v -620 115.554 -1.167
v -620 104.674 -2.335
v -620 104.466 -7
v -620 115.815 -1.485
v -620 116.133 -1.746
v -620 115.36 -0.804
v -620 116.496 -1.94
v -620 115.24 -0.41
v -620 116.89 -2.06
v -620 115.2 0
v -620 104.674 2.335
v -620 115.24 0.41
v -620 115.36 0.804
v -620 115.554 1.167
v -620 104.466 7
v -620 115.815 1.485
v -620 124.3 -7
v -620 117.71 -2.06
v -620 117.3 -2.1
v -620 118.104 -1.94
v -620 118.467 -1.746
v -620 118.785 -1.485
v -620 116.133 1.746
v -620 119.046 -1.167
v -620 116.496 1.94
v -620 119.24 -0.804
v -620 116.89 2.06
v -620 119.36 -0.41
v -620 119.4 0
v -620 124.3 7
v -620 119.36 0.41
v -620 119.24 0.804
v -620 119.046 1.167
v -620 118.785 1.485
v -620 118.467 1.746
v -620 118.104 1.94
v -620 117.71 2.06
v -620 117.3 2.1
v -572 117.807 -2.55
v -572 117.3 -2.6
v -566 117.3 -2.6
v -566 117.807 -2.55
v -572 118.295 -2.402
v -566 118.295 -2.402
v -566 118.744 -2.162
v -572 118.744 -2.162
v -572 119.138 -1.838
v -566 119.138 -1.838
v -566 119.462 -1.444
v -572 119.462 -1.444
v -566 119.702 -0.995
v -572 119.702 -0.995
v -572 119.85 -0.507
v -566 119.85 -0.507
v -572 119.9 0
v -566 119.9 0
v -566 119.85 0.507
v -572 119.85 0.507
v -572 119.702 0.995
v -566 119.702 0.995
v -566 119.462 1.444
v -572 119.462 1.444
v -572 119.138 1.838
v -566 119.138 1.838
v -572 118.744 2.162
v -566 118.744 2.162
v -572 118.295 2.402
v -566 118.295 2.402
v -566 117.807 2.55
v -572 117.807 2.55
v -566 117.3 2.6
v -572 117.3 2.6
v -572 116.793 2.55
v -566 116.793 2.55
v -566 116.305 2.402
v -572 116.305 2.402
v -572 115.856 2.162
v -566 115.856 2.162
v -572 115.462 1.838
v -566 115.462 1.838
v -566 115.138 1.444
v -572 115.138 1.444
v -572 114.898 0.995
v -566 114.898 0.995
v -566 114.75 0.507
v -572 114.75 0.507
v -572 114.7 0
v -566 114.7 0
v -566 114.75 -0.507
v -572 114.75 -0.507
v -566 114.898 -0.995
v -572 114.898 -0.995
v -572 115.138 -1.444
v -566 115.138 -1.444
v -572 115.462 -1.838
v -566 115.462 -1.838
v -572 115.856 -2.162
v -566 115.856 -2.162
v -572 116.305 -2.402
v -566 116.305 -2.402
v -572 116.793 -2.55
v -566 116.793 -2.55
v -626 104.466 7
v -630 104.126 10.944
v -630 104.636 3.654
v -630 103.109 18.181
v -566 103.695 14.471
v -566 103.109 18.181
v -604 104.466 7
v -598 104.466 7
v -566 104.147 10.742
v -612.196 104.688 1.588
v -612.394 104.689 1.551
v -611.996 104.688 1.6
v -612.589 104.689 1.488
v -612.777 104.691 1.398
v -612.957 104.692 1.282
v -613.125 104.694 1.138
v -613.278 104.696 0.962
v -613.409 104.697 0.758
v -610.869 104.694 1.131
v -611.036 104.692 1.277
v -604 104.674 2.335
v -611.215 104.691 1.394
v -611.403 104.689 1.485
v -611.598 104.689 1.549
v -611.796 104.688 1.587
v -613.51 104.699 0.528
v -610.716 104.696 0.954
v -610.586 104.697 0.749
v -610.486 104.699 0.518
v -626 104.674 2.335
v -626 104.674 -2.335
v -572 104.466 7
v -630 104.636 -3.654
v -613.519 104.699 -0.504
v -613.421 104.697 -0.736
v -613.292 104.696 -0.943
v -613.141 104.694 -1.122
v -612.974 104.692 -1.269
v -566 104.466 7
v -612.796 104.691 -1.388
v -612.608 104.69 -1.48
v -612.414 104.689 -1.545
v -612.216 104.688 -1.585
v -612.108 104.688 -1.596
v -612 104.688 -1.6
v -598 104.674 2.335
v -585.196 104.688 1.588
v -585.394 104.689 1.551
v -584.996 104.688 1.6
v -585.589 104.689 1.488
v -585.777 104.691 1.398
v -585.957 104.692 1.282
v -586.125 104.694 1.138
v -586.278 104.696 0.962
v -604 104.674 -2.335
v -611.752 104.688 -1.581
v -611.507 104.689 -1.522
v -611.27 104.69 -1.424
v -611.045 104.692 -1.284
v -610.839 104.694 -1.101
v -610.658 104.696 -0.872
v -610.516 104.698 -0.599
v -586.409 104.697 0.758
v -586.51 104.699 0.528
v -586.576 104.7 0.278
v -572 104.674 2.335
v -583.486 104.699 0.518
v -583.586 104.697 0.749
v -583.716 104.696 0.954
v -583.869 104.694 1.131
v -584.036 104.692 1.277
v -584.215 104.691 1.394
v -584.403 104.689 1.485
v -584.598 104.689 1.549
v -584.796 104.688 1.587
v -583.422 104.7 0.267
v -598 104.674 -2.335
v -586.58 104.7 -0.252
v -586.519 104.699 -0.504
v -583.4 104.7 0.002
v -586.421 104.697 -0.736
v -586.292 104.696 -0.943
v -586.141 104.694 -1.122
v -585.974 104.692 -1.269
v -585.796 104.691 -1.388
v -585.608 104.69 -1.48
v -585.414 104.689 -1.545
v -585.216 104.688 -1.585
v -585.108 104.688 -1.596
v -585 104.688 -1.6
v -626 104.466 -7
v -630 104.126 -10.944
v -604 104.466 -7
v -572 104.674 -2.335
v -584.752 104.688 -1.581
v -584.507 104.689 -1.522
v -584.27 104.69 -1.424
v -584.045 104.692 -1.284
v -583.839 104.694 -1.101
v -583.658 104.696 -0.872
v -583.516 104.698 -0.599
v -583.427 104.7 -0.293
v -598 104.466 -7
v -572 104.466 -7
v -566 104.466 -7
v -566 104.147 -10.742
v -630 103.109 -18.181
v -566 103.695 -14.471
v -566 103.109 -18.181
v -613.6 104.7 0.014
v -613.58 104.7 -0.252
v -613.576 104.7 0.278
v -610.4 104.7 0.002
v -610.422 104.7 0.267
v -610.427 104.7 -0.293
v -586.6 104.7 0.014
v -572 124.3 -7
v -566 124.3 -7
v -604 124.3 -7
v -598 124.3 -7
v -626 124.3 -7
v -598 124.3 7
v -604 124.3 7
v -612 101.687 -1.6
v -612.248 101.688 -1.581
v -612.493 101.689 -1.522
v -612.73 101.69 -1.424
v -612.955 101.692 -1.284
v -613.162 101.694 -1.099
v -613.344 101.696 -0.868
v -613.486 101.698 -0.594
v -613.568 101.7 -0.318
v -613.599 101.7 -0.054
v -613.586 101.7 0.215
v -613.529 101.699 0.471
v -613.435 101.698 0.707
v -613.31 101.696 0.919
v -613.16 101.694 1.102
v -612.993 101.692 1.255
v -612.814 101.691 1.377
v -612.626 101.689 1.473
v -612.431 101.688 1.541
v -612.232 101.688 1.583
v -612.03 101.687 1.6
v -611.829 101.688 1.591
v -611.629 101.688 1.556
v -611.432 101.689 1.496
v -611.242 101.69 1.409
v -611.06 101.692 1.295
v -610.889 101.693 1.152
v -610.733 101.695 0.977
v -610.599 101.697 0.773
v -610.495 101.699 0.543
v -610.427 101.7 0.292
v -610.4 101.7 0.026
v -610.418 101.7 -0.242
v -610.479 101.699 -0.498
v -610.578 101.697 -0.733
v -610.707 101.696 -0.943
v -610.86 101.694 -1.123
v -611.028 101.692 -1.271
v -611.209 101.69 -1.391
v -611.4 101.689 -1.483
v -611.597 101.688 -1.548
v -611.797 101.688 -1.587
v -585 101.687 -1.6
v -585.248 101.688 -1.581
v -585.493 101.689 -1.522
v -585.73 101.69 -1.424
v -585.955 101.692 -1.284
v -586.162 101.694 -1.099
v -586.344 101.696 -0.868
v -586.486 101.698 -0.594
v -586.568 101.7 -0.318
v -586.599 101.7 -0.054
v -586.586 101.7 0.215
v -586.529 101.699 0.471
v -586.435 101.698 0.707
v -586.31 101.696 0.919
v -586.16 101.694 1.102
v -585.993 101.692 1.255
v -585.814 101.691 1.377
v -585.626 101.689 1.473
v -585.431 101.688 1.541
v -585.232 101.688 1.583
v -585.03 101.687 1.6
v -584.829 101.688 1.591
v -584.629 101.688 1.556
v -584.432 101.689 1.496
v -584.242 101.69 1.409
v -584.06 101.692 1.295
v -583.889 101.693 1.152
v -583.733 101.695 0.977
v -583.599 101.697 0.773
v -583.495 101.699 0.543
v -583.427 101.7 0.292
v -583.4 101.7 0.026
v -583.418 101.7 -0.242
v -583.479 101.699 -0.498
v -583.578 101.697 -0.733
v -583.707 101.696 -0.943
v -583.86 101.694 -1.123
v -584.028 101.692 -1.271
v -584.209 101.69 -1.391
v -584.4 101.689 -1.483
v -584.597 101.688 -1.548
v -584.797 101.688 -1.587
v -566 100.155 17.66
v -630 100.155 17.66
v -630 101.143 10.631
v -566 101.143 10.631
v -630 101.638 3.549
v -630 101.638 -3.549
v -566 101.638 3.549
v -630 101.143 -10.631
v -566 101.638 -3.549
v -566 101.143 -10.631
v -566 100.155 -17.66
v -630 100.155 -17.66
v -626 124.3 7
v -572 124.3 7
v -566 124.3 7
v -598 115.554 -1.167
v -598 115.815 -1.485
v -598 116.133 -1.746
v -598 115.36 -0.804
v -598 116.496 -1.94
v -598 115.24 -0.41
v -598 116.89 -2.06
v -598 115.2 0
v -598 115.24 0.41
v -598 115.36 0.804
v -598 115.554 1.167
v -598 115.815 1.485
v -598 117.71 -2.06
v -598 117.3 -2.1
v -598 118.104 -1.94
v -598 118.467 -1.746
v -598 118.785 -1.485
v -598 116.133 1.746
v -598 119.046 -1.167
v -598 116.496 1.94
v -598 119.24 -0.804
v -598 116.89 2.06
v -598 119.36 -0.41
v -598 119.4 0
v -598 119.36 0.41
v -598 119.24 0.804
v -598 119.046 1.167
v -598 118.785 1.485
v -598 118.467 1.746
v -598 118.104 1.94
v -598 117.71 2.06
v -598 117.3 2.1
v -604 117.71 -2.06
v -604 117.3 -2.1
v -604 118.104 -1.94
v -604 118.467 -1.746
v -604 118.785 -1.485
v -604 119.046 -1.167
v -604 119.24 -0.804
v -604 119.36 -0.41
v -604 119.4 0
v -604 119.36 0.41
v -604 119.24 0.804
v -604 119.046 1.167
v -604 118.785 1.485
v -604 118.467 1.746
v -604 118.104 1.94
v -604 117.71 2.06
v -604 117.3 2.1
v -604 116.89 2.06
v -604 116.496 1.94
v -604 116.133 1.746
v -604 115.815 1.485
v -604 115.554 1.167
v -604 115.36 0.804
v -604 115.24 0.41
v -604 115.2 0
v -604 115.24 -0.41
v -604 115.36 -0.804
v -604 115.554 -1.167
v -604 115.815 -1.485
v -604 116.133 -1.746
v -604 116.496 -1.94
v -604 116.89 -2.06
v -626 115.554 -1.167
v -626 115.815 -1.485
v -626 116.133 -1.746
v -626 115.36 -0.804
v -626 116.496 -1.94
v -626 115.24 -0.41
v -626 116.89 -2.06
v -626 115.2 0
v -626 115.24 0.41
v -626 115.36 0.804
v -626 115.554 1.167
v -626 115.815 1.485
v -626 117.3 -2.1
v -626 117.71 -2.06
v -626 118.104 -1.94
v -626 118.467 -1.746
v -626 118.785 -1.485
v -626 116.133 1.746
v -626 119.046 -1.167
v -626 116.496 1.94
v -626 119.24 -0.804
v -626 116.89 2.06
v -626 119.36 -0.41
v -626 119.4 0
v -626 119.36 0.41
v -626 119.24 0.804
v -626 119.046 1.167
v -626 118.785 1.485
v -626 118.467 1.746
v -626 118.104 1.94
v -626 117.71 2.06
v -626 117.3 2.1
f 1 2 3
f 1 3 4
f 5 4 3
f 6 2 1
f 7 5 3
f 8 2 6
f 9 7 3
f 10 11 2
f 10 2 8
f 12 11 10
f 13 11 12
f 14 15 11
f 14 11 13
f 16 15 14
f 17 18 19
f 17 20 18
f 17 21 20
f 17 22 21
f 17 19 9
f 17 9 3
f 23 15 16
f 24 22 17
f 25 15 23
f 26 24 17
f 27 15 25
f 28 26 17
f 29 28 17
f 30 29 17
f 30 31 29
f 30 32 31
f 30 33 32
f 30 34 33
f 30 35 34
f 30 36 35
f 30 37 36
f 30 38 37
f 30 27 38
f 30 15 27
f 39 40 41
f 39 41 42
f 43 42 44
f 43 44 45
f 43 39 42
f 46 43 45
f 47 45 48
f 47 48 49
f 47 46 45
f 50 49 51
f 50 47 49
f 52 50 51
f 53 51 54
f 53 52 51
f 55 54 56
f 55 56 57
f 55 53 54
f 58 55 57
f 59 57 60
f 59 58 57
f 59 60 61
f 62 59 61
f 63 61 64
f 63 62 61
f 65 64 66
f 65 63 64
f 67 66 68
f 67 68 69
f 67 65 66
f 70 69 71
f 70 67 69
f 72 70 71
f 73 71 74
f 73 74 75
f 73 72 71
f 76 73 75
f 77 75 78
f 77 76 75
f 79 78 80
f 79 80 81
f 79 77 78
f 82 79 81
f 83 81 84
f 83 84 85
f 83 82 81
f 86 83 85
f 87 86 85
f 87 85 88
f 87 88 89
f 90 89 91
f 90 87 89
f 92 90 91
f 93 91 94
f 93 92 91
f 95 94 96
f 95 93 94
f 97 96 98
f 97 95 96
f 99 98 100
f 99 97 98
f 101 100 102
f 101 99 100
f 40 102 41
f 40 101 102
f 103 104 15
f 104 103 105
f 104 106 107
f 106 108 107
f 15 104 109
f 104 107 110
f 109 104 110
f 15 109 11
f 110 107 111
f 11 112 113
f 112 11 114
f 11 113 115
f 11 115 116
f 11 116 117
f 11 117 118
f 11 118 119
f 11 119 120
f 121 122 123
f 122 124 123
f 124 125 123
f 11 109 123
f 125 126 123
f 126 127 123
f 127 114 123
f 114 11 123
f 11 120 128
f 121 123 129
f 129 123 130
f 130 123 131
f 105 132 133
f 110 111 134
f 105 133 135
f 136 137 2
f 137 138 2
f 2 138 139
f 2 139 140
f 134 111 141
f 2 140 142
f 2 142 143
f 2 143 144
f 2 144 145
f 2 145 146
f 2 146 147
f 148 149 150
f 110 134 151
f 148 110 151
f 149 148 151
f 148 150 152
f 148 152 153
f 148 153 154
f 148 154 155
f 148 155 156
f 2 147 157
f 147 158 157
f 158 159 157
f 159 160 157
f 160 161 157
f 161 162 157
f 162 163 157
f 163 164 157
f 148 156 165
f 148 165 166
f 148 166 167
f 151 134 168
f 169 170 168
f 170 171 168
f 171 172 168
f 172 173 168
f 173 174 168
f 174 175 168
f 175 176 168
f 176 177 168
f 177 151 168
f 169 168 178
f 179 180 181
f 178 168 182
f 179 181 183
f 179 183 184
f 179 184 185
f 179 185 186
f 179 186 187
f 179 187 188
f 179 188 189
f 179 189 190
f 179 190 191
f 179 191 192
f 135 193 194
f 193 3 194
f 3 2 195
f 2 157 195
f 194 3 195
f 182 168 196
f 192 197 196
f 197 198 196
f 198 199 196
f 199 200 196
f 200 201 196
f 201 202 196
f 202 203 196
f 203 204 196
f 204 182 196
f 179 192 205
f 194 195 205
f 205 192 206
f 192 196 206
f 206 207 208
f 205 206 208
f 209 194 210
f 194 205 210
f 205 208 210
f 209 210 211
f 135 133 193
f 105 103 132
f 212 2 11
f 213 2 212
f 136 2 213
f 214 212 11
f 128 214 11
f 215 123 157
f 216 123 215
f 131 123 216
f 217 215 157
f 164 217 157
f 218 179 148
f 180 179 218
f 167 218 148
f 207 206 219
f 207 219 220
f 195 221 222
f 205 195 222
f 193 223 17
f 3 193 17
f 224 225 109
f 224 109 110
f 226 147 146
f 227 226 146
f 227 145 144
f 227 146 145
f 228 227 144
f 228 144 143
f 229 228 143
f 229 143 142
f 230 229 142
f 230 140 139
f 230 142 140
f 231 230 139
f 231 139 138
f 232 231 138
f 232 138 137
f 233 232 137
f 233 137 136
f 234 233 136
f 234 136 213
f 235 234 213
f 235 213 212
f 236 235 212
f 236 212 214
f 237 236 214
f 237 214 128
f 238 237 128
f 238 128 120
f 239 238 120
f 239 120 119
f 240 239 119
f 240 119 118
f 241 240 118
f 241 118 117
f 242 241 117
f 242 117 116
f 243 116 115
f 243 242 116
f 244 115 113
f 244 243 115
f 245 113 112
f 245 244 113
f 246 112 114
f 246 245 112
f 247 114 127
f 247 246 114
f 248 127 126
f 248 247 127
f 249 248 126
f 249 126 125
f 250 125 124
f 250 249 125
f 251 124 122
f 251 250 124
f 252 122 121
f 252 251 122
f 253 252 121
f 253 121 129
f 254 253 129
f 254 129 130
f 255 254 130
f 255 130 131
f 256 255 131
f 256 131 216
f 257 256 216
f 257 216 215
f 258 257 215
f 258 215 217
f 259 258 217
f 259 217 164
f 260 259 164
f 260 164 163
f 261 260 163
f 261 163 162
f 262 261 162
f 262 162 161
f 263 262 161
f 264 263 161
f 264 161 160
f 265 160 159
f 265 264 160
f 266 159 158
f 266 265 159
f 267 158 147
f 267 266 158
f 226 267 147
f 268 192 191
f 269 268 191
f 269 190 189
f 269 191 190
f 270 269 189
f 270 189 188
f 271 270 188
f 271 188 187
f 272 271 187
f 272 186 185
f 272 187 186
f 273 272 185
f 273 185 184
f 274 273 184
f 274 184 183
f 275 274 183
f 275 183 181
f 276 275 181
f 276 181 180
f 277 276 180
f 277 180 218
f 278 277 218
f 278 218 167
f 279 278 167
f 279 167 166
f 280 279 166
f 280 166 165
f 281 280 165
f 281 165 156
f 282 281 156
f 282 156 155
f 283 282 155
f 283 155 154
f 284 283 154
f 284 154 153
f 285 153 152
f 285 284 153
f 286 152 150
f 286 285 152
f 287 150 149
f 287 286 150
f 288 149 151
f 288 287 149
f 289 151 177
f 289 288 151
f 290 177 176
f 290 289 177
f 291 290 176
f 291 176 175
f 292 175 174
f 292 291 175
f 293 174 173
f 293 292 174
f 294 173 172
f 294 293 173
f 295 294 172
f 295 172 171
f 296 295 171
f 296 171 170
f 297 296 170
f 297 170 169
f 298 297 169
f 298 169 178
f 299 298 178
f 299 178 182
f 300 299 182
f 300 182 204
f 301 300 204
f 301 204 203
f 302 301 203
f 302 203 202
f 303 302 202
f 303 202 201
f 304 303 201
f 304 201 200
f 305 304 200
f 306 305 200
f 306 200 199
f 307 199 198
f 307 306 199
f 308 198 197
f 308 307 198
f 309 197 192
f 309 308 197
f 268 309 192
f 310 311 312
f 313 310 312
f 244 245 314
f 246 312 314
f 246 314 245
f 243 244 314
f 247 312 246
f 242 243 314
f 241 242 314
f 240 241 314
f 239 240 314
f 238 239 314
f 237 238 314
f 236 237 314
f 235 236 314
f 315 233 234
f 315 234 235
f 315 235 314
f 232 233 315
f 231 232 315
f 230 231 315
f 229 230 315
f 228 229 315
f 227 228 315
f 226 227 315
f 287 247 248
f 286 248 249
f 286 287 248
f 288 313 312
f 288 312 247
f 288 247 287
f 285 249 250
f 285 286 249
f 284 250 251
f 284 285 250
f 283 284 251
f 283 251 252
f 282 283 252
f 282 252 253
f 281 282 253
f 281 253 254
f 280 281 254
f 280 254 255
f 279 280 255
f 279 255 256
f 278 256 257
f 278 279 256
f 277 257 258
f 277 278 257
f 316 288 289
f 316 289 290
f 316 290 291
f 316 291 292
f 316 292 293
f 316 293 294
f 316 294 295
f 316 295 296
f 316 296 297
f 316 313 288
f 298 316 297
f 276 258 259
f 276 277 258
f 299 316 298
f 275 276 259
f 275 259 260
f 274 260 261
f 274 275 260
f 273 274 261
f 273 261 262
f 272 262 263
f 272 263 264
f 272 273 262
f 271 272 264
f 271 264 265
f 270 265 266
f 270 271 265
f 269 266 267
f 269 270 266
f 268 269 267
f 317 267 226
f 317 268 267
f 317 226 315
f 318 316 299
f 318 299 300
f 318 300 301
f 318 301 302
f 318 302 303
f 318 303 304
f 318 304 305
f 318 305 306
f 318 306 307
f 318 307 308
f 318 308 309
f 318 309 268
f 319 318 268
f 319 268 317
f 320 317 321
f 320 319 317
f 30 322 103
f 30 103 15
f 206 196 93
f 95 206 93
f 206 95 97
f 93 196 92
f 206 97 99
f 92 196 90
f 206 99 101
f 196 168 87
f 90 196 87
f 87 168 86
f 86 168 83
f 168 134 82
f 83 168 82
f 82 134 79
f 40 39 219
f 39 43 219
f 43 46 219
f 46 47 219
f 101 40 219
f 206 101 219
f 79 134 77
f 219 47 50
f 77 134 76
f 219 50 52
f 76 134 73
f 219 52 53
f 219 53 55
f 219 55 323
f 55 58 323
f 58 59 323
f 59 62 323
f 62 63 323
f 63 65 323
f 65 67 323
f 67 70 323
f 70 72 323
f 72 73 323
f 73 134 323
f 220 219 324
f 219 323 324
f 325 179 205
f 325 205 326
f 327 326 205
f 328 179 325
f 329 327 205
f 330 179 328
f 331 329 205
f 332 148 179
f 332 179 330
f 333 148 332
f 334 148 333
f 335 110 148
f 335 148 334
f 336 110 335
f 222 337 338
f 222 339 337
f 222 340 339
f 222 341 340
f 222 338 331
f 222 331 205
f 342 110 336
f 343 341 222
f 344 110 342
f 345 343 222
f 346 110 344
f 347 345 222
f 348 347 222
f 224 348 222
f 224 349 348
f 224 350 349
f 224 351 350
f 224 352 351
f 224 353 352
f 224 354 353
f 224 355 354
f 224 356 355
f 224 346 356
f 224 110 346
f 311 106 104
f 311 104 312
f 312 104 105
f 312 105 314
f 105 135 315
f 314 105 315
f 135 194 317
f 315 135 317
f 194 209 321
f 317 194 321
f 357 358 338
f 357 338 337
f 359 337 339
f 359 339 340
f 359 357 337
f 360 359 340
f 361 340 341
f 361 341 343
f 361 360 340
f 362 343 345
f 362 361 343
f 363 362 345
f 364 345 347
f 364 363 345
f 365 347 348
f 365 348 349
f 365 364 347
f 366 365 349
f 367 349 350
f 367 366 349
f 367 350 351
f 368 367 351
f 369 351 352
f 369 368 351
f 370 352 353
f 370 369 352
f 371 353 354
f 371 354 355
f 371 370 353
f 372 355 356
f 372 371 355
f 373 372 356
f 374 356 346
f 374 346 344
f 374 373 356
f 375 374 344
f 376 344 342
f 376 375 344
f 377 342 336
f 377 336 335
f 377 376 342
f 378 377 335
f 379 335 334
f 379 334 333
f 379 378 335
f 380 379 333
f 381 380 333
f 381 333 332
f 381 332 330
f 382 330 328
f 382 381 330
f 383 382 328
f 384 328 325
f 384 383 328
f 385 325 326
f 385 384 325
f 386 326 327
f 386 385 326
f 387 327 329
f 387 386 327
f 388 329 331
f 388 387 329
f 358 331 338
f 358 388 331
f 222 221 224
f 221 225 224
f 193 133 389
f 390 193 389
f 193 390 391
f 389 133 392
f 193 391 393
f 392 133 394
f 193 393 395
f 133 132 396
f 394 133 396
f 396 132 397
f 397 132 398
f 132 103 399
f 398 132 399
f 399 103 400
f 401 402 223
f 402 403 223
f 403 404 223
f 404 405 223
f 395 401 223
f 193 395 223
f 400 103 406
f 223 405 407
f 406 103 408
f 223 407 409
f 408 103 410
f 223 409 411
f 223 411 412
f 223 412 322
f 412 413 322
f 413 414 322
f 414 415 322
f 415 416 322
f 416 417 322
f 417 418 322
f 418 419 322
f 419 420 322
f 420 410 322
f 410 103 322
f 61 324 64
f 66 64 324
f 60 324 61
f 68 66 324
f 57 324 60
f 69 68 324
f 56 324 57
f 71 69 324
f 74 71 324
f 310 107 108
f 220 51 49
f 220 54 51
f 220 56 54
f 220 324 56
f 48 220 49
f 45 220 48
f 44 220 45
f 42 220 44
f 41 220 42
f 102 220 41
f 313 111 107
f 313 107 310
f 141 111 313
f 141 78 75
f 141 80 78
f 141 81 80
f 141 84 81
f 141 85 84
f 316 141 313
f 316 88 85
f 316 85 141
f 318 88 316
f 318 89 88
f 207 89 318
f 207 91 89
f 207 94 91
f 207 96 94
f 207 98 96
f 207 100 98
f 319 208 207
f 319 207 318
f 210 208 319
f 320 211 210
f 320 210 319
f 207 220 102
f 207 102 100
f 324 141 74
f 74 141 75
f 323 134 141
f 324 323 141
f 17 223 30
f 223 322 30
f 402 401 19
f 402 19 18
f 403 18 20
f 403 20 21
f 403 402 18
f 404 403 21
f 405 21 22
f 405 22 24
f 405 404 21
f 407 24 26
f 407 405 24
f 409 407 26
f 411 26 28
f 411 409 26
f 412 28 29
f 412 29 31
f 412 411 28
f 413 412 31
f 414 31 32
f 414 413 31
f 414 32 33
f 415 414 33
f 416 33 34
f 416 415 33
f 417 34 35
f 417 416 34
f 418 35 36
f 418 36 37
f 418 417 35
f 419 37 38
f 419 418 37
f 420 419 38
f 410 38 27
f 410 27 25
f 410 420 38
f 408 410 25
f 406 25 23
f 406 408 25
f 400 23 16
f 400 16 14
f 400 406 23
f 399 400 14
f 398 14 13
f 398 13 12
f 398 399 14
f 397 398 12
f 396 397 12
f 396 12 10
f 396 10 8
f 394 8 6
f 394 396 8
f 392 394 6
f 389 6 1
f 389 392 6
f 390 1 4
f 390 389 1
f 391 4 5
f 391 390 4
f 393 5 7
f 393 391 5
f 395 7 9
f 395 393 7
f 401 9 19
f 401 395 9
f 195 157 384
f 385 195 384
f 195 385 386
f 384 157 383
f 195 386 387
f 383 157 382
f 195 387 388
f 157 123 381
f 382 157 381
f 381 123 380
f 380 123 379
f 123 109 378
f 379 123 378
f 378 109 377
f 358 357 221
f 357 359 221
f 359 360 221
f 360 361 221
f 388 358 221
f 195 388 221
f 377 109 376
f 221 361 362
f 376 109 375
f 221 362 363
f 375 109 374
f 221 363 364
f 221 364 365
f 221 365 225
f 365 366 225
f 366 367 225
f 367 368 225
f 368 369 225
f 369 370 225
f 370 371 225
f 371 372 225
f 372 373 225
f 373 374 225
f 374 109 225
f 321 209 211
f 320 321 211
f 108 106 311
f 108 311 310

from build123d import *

# Parameters (mm, degrees)
BASE_SKETCH_W           = 64
BASE_SKETCH_H           = 3
BASE_ANGLE              = 20
UPPER_EAR_SKETCH_W      = 6
UPPER_EAR_SKETCH_H      = 20.8
UPPER_EAR_DEPTH         = 7
LOWER_EAR_SKETCH_W      = 6
LOWER_EAR_SKETCH_H      = 20.8
LOWER_EAR_DEPTH         = 7
STOP_SKETCH_W           = 6
STOP_SKETCH_H           = 20.8
STOP_DEPTH              = 7
UPPER_EAR_HOLE_SKETCH_R = 2.1
UPPER_EAR_HOLE_DEPTH    = 6
LOWER_EAR_HOLE_SKETCH_R = 2.1
LOWER_EAR_HOLE_DEPTH    = 6
STOP_HOLE_SKETCH_R      = 2.6
STOP_HOLE_DEPTH         = 6
SCREW_HOLE_0_SKETCH_R   = 1.6
SCREW_HOLE_0_DEPTH      = 200
SCREW_HOLE_1_SKETCH_R   = 1.6
SCREW_HOLE_1_DEPTH      = 200


with BuildPart() as part:
    # Base Sketch → Base (revolve, symmetric)
    with BuildSketch(Plane.XY) as base_sk:
        with Locations((-598, 103.2)):
            Rectangle(BASE_SKETCH_W, BASE_SKETCH_H)
    revolve(axis=Axis((-3000, 0, 0), (1, 0, 0)), revolution_arc=BASE_ANGLE / 2)
    revolve(base_sk.sketch, axis=Axis((-3000, 0, 0), (-1, 0, 0)), revolution_arc=BASE_ANGLE / 2)

    # Upper Ear Sketch → Upper Ear (add, symmetric)
    with BuildSketch(Plane.XY):
        with Locations((-623, 113.9)):
            Rectangle(UPPER_EAR_SKETCH_W, UPPER_EAR_SKETCH_H)
    extrude(amount=UPPER_EAR_DEPTH, both=True)

    # Lower Ear Sketch → Lower Ear (add, symmetric)
    with BuildSketch(Plane.XY):
        with Locations((-601, 113.9)):
            Rectangle(LOWER_EAR_SKETCH_W, LOWER_EAR_SKETCH_H)
    extrude(amount=LOWER_EAR_DEPTH, both=True)

    # Stop Sketch → Stop (add, symmetric)
    with BuildSketch(Plane.XY):
        with Locations((-569, 113.9)):
            Rectangle(STOP_SKETCH_W, STOP_SKETCH_H)
    extrude(amount=STOP_DEPTH, both=True)

    # Upper Ear Hole Sketch → Upper Ear Hole (cut)
    with BuildSketch(Plane(origin=(-626, 0, 0), x_dir=(0, 0, -1), z_dir=(1, 0, 0))):
        with Locations((0, 117.3)):
            Circle(UPPER_EAR_HOLE_SKETCH_R)
    extrude(amount=UPPER_EAR_HOLE_DEPTH, mode=Mode.SUBTRACT)

    # Lower Ear Hole Sketch → Lower Ear Hole (cut)
    with BuildSketch(Plane(origin=(-604, 0, 0), x_dir=(0, 0, -1), z_dir=(1, 0, 0))):
        with Locations((0, 117.3)):
            Circle(LOWER_EAR_HOLE_SKETCH_R)
    extrude(amount=LOWER_EAR_HOLE_DEPTH, mode=Mode.SUBTRACT)

    # Stop Hole Sketch → Stop Hole (cut)
    with BuildSketch(Plane(origin=(-572, 0, 0), x_dir=(0, 0, -1), z_dir=(1, 0, 0))):
        with Locations((0, 117.3)):
            Circle(STOP_HOLE_SKETCH_R)
    extrude(amount=STOP_HOLE_DEPTH, mode=Mode.SUBTRACT)

    # Screw Hole 0 Sketch → Screw Hole 0 (cut)
    with BuildSketch(Plane(origin=(0, 0, 0), x_dir=(-1, 0, 0), z_dir=(0, 1, 0))):
        with Locations((585, 0)):
            Circle(SCREW_HOLE_0_SKETCH_R)
    extrude(amount=SCREW_HOLE_0_DEPTH, mode=Mode.SUBTRACT)

    # Screw Hole 1 Sketch → Screw Hole 1 (cut)
    with BuildSketch(Plane(origin=(0, 0, 0), x_dir=(-1, 0, 0), z_dir=(0, 1, 0))):
        with Locations((612, 0)):
            Circle(SCREW_HOLE_1_SKETCH_R)
    extrude(amount=SCREW_HOLE_1_DEPTH, mode=Mode.SUBTRACT)


solid = part.part
